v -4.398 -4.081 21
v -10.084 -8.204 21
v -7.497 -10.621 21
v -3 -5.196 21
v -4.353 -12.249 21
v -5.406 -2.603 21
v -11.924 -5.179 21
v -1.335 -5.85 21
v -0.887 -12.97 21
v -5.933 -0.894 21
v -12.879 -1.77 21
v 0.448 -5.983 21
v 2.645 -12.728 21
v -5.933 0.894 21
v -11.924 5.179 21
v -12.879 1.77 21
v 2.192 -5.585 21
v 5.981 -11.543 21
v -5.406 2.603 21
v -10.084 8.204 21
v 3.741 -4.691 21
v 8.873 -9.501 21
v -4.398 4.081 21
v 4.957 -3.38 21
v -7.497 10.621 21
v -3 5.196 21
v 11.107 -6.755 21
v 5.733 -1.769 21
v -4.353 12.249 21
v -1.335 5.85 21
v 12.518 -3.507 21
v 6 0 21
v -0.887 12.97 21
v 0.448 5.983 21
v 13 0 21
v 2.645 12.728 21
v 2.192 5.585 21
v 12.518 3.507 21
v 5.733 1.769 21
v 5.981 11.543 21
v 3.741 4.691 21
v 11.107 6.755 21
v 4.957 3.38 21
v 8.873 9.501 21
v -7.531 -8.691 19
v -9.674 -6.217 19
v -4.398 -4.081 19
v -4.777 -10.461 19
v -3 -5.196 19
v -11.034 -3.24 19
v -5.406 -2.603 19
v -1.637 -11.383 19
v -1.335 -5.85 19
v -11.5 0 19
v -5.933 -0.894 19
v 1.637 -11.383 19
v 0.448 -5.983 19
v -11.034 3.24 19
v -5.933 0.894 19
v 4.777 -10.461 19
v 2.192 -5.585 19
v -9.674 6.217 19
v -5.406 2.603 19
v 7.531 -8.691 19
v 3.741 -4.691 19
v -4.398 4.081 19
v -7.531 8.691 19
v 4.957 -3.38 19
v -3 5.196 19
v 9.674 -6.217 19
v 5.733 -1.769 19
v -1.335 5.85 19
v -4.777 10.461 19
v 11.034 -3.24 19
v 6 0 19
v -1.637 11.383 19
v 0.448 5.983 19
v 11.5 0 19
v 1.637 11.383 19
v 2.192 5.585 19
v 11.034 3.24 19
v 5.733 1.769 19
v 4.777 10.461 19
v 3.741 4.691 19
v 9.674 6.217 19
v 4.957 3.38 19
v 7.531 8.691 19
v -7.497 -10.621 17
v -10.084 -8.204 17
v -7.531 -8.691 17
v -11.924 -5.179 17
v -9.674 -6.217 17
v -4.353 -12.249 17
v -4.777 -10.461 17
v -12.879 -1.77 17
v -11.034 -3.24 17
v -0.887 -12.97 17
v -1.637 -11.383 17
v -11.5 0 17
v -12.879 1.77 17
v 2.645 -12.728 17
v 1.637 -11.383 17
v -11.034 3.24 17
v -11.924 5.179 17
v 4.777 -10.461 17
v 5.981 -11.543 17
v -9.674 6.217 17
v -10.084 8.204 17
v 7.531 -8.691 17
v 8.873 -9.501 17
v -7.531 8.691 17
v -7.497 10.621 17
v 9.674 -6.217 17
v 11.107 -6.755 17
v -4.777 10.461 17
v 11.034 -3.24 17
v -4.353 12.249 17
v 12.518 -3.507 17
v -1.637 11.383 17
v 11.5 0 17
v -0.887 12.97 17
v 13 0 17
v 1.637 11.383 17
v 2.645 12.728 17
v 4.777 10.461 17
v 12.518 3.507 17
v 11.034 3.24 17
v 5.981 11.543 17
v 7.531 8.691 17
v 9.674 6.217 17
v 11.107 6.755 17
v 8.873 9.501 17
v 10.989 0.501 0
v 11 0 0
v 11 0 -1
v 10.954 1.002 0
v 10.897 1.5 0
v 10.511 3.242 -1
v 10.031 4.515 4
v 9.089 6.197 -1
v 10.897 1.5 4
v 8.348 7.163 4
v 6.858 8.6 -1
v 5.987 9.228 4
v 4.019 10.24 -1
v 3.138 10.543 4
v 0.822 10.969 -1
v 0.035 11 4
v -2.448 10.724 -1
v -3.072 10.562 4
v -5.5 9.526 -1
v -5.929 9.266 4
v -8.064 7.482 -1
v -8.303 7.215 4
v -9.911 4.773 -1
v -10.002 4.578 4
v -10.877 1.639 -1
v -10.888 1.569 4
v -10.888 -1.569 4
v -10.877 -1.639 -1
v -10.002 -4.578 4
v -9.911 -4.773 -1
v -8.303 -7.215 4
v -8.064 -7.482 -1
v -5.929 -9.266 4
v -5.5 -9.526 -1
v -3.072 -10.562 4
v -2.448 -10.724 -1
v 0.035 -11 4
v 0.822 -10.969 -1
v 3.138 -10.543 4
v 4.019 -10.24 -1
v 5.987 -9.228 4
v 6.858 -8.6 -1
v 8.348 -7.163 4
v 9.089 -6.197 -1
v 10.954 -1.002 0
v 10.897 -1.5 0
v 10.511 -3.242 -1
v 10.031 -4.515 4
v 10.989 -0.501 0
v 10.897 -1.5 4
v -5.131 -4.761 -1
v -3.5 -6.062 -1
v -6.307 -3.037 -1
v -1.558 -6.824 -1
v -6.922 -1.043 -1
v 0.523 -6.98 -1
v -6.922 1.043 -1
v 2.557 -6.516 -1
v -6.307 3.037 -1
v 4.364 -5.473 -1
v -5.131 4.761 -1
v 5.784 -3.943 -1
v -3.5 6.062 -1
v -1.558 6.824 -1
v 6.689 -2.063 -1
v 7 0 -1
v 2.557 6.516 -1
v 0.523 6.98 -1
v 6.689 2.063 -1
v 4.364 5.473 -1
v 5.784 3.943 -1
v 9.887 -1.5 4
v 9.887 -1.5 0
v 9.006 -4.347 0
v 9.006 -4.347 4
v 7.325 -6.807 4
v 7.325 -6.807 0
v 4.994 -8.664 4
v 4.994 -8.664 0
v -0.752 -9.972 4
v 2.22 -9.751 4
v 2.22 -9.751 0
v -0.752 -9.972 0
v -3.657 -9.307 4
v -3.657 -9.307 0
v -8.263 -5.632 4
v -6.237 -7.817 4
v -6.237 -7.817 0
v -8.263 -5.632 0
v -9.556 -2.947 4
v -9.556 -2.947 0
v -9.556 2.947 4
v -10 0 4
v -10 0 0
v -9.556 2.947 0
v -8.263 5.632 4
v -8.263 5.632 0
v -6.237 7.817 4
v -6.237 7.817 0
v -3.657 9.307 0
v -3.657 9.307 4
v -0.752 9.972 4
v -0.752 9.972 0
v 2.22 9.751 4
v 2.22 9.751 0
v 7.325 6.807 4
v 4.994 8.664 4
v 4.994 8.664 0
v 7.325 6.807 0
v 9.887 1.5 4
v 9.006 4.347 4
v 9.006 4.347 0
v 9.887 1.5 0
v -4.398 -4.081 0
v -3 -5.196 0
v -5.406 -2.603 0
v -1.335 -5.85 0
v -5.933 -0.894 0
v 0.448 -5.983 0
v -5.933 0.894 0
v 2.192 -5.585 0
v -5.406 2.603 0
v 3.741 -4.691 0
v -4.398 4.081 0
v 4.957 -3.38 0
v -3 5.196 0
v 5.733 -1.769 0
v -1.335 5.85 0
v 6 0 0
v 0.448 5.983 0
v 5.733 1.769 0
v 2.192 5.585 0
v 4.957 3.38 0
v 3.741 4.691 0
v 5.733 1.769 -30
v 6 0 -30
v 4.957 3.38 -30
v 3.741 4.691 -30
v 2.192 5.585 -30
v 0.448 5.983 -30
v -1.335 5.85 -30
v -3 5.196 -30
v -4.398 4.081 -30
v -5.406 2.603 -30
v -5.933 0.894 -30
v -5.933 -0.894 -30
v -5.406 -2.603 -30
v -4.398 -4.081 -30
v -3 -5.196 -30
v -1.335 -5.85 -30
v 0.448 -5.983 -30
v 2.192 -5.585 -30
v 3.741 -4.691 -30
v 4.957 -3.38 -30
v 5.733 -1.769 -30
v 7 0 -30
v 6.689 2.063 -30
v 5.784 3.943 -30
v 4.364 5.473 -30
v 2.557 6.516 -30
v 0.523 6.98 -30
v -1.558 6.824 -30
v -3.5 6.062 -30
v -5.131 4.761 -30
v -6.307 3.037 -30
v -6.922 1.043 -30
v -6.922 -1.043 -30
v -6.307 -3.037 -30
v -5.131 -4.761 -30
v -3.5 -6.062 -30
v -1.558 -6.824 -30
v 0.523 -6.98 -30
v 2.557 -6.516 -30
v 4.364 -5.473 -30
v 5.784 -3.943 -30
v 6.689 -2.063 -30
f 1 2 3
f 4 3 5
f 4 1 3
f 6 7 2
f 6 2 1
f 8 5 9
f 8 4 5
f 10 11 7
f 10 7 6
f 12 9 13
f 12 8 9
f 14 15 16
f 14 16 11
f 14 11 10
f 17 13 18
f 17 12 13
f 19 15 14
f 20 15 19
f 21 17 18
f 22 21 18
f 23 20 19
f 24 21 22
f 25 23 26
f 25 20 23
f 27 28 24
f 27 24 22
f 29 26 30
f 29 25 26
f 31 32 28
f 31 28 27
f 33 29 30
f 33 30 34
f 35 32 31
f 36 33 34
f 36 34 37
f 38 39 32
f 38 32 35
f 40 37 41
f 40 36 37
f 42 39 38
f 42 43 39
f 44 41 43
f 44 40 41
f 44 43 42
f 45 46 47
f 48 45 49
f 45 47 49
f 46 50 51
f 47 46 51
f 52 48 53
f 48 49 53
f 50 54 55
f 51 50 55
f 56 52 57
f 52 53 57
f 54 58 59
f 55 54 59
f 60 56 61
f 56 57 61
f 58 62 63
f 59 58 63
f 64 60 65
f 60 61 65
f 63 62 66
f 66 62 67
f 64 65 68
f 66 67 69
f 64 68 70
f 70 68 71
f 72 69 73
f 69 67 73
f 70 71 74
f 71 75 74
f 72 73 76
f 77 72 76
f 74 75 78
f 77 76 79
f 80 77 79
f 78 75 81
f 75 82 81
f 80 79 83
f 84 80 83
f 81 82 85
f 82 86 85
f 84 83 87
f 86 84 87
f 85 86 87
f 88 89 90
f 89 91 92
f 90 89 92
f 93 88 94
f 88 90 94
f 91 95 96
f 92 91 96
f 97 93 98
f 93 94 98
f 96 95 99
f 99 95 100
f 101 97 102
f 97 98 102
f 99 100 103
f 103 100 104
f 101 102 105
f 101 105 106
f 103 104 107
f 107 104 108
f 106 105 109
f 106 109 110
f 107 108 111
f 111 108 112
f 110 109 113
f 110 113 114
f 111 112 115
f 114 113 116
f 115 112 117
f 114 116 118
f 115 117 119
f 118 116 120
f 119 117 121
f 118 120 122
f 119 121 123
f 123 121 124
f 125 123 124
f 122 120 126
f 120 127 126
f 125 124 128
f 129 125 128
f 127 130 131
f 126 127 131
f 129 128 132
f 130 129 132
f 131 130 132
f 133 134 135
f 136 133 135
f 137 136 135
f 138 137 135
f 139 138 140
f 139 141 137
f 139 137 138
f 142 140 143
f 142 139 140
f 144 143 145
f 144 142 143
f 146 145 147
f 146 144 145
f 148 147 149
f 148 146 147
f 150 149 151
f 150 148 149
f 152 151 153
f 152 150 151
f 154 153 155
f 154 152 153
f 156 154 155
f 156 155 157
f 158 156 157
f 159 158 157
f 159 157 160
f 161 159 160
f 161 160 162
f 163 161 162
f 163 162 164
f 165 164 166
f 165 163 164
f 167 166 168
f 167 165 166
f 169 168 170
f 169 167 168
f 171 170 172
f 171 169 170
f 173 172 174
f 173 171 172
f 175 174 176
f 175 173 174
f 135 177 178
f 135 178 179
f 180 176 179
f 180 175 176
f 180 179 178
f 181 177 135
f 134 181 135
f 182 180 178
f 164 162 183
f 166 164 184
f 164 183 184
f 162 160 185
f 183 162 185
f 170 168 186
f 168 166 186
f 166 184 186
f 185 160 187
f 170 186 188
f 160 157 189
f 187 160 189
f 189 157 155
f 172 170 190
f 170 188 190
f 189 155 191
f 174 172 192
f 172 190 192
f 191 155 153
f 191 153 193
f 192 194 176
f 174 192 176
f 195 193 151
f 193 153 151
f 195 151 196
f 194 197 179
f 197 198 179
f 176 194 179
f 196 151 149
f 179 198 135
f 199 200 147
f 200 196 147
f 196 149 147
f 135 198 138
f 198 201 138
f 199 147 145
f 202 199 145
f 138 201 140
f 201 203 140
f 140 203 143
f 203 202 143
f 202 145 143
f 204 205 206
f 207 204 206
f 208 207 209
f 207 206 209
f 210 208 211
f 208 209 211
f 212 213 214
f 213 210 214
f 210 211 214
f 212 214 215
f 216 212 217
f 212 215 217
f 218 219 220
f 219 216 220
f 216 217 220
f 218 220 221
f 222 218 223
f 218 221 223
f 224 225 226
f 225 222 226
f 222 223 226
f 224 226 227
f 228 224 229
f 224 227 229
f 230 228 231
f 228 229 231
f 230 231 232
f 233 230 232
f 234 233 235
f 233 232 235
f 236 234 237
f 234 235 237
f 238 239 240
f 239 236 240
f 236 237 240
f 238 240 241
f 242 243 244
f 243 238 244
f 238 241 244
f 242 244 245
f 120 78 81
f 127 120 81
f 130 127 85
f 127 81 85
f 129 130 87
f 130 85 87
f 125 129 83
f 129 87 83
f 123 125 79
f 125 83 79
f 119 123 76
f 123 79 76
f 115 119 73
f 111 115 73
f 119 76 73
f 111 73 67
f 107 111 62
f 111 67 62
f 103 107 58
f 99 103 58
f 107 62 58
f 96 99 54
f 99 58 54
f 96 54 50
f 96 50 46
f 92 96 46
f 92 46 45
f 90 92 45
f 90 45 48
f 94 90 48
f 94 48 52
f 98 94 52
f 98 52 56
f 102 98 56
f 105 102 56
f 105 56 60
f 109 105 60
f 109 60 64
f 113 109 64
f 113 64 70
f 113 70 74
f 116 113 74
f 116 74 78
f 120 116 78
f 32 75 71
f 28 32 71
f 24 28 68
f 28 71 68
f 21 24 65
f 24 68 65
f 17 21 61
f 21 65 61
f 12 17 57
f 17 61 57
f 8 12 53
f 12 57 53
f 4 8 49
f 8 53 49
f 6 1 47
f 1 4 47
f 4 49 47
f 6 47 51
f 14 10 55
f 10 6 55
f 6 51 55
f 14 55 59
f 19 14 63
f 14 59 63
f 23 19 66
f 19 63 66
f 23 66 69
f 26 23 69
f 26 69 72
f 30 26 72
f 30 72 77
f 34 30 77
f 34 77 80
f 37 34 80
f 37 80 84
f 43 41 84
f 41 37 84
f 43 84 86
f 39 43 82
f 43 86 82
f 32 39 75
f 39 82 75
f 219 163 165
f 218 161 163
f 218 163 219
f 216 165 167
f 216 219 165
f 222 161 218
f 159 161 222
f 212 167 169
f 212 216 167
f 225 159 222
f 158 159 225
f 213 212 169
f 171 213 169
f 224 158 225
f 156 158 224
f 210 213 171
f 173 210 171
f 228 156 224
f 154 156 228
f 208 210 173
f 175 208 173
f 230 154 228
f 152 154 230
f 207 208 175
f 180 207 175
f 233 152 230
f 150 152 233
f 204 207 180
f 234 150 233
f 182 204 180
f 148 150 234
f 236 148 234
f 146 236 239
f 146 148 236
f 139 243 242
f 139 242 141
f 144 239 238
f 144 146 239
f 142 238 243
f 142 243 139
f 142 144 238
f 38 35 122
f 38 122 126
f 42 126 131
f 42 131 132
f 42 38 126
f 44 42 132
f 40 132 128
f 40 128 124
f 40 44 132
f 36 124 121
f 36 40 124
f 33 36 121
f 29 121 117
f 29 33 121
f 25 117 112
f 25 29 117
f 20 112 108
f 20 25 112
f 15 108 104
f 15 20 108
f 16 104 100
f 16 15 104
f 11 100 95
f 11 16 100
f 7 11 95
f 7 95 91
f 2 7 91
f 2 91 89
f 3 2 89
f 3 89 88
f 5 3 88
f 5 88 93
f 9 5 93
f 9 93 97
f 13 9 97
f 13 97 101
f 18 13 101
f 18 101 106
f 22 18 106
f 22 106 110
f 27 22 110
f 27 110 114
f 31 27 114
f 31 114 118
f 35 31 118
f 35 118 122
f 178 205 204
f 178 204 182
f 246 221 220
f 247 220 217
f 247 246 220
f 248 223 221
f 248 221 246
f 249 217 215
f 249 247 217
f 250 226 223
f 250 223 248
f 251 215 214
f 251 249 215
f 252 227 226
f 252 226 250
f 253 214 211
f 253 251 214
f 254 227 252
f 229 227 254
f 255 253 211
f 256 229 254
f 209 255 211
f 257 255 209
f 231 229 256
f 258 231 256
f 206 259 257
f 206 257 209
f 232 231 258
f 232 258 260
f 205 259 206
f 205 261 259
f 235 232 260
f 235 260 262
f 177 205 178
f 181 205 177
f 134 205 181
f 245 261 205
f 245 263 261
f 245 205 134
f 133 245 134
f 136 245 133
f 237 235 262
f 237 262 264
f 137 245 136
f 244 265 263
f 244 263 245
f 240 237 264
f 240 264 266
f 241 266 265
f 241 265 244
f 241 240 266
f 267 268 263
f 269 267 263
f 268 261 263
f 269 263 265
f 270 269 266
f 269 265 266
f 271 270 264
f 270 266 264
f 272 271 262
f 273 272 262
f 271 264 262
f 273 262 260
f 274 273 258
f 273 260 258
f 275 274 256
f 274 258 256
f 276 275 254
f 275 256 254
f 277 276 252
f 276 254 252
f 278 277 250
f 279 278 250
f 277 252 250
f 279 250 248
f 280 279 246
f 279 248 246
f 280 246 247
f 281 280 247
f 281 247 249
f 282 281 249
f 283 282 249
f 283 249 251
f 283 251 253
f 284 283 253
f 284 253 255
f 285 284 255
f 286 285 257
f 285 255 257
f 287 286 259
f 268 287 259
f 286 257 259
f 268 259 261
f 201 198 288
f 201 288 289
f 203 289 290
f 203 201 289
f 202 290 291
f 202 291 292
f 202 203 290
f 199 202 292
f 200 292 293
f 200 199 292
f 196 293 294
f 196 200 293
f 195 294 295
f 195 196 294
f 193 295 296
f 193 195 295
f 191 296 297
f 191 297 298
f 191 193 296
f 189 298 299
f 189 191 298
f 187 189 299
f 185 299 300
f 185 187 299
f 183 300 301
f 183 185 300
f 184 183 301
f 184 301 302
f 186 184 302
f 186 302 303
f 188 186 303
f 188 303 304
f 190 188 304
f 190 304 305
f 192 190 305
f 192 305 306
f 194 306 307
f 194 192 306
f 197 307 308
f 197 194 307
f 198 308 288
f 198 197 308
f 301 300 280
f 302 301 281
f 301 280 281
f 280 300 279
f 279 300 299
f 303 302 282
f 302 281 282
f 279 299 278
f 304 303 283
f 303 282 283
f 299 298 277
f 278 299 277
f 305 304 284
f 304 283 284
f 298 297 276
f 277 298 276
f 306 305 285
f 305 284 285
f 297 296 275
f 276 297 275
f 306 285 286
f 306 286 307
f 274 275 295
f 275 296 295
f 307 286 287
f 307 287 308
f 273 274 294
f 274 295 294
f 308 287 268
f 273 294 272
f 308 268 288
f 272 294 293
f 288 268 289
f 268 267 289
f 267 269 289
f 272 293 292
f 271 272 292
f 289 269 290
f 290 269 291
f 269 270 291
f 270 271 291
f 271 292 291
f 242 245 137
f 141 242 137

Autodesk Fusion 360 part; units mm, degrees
sketch "Sketch1" plane through (0, 0, 0) normal (0, 0, 1) x (1, 0, 0)
  circle A0 centre (0, 0) radius 10
  circle A1 centre (0, 0) radius 6
  circle A2 centre (0, 0) radius 11
  circle A3 centre (0, 0) radius 7
  line L0 (9.8869, -1.5) -> (10.8972, -1.5)
  line L1 (9.8869, 1.5) -> (10.8972, 1.5)
  dimension "d1" = 20
  dimension "d2" = 12
extrude "Extrude1" add sketch "Sketch1" against normal blind 30 contours A3 makes body 1
extrude "Extrude2" add sketch "Sketch1" against normal blind 1 contours A0 | A0 A2 L0 L1 | A0 A2 L0 L1 bodies 1
extrude "Extrude3" add sketch "Sketch1" along normal blind 4 contours A0 A2 L0 L1 | A0 A2 L0 L1 bodies 1
extrude "Extrude4" cut sketch "Sketch1" along normal blind 10.5 contours A0 A2 L0 L1 picked at (10.2446, 1.334) bodies 1
ref_plane "WorkPlane1" through (0, 0, 19) normal (0, 0, 1) x (1, 0, 0)
sketch "Sketch2" plane through (0, 0, 19) normal (0, 0, 1) x (1, 0, 0)
  circle A0 centre (0, 0) radius 11
  circle A1 centre (0, 0) radius 11.5
  circle A2 centre (0, 0) radius 13
  circle A3 centre (0, 0) radius 6
  dimension "d14" = 0.5
  dimension "d15" = 2
  dimension "d16" = 12
extrude "Extrude5" add sketch "Sketch2" along normal blind 2 separate body contours A0 | A1 | A2 makes body 2
extrude "Extrude6" add sketch "Sketch2" against normal blind 2 contours A2 bodies 2
